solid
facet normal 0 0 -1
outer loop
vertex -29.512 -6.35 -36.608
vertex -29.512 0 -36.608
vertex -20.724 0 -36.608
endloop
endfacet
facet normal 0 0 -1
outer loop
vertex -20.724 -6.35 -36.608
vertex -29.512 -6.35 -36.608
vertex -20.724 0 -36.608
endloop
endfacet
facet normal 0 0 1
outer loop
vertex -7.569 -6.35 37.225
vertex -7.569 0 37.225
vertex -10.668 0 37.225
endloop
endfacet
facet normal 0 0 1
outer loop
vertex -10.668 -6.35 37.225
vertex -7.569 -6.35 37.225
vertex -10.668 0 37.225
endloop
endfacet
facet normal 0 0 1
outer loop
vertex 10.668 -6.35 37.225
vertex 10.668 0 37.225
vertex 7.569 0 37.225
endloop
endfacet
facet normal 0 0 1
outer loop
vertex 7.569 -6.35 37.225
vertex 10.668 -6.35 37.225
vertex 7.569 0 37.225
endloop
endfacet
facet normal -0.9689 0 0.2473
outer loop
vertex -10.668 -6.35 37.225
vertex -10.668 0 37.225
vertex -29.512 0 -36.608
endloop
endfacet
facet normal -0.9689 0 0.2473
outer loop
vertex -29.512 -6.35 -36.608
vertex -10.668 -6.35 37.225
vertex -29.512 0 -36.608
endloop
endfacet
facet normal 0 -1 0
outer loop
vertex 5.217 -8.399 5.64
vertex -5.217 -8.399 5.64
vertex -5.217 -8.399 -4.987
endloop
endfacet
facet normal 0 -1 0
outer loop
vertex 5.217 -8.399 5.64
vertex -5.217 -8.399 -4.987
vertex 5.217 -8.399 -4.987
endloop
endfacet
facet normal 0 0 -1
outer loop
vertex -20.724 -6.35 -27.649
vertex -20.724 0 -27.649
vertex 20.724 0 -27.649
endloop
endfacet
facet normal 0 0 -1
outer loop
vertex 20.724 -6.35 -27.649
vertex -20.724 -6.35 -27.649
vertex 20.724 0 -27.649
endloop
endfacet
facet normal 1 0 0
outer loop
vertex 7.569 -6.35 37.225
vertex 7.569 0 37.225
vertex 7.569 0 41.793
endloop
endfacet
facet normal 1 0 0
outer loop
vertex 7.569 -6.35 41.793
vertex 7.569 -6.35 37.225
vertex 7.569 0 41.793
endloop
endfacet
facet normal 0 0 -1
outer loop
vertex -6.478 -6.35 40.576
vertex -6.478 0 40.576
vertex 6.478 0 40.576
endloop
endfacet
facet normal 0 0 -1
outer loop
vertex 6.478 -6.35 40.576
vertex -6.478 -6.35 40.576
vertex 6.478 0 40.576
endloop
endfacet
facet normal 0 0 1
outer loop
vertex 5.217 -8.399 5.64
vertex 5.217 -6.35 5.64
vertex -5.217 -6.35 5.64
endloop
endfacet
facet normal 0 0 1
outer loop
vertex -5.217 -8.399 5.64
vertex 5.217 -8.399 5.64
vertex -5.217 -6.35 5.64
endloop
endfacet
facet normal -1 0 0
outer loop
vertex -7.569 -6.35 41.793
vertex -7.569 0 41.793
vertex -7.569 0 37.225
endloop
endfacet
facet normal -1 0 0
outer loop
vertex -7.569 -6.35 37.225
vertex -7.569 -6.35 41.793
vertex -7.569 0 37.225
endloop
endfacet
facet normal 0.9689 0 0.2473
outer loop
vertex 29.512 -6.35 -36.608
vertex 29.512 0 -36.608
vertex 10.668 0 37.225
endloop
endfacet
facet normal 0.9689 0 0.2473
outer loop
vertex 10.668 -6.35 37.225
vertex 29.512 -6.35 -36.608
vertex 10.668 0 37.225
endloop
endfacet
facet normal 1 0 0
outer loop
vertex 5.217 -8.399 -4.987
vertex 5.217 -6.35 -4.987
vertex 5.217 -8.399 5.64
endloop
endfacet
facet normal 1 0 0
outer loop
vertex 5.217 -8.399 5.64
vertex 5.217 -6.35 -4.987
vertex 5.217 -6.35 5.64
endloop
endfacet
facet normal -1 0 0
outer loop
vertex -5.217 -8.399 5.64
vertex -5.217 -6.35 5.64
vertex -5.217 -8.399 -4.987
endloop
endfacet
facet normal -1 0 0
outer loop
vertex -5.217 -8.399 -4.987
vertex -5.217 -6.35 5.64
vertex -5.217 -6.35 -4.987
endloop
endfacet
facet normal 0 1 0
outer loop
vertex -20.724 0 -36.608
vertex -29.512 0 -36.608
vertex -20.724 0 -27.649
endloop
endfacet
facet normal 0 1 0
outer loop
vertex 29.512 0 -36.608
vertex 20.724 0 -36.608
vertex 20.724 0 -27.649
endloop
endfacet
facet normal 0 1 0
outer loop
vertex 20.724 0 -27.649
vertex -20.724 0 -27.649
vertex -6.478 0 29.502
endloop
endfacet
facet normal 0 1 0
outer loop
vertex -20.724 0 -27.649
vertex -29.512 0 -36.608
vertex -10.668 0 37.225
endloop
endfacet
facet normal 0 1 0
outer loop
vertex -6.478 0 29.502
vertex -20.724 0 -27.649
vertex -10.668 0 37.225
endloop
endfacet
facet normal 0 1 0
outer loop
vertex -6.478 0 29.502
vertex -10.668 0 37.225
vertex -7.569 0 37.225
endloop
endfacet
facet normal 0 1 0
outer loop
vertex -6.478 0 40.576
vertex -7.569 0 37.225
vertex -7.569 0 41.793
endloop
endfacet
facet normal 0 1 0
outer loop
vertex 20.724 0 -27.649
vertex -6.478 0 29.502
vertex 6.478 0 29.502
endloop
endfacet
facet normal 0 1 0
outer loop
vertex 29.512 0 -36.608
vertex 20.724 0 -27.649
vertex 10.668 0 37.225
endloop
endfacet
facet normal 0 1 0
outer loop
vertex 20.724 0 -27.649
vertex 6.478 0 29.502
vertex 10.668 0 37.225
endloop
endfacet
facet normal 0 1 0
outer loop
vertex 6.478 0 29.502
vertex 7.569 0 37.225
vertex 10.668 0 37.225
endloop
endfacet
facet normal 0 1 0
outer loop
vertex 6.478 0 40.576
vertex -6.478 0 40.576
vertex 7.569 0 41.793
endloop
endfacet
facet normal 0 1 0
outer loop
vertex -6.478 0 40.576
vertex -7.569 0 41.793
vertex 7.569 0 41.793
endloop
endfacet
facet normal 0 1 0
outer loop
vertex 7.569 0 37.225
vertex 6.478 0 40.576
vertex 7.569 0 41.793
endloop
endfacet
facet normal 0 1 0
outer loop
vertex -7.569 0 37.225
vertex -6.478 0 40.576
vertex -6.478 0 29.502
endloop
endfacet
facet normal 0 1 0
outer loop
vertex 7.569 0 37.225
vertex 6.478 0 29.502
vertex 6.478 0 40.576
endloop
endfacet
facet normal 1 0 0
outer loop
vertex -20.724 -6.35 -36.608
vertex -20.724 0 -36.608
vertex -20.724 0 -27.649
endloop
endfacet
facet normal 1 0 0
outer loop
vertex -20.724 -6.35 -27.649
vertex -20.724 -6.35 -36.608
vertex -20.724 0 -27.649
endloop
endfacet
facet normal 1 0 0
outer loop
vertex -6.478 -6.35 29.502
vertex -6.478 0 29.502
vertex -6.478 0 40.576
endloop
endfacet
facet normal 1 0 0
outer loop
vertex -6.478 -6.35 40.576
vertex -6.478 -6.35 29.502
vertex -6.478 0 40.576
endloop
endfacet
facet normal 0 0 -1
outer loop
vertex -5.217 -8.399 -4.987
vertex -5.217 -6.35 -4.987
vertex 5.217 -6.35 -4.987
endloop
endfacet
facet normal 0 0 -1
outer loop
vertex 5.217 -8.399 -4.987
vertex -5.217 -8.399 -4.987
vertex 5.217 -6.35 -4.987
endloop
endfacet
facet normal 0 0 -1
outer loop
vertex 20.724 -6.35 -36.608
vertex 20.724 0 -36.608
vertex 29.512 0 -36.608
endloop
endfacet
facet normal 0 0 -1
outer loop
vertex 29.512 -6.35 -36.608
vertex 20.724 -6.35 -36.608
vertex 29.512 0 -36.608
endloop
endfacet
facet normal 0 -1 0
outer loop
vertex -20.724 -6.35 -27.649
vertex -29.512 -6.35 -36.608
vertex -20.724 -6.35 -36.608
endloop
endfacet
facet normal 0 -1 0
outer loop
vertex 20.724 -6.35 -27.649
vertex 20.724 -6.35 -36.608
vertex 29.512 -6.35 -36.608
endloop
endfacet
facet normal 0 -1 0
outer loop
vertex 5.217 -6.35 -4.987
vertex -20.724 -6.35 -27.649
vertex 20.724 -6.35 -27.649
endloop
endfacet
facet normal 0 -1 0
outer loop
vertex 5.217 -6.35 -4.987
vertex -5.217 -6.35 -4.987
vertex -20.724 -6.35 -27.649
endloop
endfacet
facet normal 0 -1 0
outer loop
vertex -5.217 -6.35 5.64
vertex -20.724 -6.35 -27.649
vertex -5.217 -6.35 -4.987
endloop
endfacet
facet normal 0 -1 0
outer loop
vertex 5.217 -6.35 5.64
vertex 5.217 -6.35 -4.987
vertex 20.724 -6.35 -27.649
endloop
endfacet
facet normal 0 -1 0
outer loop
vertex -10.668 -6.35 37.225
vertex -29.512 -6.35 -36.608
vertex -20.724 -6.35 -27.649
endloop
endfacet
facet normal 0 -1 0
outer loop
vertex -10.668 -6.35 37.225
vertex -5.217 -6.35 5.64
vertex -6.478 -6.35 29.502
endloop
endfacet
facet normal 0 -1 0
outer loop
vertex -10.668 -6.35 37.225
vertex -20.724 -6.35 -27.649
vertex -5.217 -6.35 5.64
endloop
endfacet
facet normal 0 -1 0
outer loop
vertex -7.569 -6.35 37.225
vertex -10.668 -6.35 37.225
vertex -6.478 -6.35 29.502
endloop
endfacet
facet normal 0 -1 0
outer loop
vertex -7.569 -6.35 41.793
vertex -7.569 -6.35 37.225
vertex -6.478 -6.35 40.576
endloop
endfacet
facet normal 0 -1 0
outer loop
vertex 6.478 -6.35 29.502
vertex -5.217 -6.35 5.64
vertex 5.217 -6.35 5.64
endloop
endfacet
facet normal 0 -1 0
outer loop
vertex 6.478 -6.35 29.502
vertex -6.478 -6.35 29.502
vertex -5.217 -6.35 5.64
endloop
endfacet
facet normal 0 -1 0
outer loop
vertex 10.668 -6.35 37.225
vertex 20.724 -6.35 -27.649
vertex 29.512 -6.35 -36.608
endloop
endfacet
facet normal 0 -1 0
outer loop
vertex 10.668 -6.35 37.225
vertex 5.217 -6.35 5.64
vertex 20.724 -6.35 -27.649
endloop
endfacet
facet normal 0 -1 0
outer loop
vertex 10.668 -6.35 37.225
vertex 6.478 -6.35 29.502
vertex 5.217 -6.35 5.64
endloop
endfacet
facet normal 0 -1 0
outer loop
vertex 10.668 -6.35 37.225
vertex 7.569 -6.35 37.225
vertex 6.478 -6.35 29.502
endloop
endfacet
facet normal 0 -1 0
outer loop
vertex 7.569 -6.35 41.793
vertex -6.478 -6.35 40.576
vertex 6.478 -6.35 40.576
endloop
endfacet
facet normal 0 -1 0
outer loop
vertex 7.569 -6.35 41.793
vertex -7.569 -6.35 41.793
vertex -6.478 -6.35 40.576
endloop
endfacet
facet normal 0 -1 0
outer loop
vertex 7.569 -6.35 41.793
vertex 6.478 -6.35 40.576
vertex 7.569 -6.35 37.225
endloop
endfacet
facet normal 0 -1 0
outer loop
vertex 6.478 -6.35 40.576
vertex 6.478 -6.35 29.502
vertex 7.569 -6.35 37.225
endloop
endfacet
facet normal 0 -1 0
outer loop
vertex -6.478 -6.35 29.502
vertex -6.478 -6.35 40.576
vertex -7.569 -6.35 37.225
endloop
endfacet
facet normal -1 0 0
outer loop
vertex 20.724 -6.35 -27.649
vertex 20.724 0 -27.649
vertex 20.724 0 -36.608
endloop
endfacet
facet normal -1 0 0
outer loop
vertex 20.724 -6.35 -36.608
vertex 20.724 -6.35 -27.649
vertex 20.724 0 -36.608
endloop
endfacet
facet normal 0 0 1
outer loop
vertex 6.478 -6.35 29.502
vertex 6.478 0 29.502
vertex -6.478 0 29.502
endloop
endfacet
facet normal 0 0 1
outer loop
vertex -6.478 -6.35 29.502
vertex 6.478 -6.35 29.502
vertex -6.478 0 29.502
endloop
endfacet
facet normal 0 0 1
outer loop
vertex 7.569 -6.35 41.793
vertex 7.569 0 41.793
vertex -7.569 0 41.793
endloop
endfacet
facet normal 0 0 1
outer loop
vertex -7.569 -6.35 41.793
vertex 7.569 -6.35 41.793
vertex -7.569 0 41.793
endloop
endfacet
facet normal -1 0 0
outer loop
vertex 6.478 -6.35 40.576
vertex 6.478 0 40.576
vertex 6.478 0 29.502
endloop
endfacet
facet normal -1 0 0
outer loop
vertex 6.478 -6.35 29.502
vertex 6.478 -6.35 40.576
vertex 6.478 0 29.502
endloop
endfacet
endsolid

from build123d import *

# Parameters (mm, degrees)
F0_W     = 1.090225624
F0_H     = 7.7231296032
F1_DEPTH = 6.35
F3_DEPTH = 8.39926


with BuildPart() as f1:
    # F0 (on Front) → F1 (new body)
    with BuildSketch(Plane.XZ):
        Polygon((-7.5686656406, 37.2254792051), (-10.668, 37.2254792051), (-29.5124314971, -36.6076258465), (-20.7240314971, -36.6076258465), (-20.7240314971, -27.6487994939), (0, -27.6487994939), (20.7240314971, -27.6487994939), (20.7240314971, -36.6076258465), (29.5124314971, -36.6076258465), (10.668, 37.2254792051), (7.5686656406, 37.2254792051), (7.5686656406, 29.5023496019), (6.4784400165, 29.5023496019), (0, 29.5023496019), (-6.4784400165, 29.5023496019), (-7.5686656406, 29.5023496019), align=None)
        with Locations((-7.0235528285, 33.3639144035)):
            Rectangle(F0_W, F0_H)
        Polygon((-7.5686656406, 41.7925901711), (-7.5686656406, 37.2254792051), (-6.4784400165, 37.2254792051), (-6.4784400165, 40.5764468014), (0, 40.5764468014), (6.4784400165, 40.5764468014), (6.4784400165, 37.2254792051), (7.5686656406, 37.2254792051), (7.5686656406, 41.7925901711), (0, 41.7925901711), align=None)
        with Locations((7.0235528285, 33.3639144035)):
            Rectangle(F0_W, F0_H)
    extrude(amount=F1_DEPTH)

    # F2 (on Front) → F3 (join)
    with BuildSketch(Plane.XZ):
        Polygon((0, 5.6396927685), (-5.2173733711, 5.6396927685), (-5.2173733711, -4.9869618379), (0, -4.9869618379), (5.2173733711, -4.9869618379), (5.2173733711, 5.6396927685), align=None)
    extrude(amount=F3_DEPTH)


solid = f1.part
